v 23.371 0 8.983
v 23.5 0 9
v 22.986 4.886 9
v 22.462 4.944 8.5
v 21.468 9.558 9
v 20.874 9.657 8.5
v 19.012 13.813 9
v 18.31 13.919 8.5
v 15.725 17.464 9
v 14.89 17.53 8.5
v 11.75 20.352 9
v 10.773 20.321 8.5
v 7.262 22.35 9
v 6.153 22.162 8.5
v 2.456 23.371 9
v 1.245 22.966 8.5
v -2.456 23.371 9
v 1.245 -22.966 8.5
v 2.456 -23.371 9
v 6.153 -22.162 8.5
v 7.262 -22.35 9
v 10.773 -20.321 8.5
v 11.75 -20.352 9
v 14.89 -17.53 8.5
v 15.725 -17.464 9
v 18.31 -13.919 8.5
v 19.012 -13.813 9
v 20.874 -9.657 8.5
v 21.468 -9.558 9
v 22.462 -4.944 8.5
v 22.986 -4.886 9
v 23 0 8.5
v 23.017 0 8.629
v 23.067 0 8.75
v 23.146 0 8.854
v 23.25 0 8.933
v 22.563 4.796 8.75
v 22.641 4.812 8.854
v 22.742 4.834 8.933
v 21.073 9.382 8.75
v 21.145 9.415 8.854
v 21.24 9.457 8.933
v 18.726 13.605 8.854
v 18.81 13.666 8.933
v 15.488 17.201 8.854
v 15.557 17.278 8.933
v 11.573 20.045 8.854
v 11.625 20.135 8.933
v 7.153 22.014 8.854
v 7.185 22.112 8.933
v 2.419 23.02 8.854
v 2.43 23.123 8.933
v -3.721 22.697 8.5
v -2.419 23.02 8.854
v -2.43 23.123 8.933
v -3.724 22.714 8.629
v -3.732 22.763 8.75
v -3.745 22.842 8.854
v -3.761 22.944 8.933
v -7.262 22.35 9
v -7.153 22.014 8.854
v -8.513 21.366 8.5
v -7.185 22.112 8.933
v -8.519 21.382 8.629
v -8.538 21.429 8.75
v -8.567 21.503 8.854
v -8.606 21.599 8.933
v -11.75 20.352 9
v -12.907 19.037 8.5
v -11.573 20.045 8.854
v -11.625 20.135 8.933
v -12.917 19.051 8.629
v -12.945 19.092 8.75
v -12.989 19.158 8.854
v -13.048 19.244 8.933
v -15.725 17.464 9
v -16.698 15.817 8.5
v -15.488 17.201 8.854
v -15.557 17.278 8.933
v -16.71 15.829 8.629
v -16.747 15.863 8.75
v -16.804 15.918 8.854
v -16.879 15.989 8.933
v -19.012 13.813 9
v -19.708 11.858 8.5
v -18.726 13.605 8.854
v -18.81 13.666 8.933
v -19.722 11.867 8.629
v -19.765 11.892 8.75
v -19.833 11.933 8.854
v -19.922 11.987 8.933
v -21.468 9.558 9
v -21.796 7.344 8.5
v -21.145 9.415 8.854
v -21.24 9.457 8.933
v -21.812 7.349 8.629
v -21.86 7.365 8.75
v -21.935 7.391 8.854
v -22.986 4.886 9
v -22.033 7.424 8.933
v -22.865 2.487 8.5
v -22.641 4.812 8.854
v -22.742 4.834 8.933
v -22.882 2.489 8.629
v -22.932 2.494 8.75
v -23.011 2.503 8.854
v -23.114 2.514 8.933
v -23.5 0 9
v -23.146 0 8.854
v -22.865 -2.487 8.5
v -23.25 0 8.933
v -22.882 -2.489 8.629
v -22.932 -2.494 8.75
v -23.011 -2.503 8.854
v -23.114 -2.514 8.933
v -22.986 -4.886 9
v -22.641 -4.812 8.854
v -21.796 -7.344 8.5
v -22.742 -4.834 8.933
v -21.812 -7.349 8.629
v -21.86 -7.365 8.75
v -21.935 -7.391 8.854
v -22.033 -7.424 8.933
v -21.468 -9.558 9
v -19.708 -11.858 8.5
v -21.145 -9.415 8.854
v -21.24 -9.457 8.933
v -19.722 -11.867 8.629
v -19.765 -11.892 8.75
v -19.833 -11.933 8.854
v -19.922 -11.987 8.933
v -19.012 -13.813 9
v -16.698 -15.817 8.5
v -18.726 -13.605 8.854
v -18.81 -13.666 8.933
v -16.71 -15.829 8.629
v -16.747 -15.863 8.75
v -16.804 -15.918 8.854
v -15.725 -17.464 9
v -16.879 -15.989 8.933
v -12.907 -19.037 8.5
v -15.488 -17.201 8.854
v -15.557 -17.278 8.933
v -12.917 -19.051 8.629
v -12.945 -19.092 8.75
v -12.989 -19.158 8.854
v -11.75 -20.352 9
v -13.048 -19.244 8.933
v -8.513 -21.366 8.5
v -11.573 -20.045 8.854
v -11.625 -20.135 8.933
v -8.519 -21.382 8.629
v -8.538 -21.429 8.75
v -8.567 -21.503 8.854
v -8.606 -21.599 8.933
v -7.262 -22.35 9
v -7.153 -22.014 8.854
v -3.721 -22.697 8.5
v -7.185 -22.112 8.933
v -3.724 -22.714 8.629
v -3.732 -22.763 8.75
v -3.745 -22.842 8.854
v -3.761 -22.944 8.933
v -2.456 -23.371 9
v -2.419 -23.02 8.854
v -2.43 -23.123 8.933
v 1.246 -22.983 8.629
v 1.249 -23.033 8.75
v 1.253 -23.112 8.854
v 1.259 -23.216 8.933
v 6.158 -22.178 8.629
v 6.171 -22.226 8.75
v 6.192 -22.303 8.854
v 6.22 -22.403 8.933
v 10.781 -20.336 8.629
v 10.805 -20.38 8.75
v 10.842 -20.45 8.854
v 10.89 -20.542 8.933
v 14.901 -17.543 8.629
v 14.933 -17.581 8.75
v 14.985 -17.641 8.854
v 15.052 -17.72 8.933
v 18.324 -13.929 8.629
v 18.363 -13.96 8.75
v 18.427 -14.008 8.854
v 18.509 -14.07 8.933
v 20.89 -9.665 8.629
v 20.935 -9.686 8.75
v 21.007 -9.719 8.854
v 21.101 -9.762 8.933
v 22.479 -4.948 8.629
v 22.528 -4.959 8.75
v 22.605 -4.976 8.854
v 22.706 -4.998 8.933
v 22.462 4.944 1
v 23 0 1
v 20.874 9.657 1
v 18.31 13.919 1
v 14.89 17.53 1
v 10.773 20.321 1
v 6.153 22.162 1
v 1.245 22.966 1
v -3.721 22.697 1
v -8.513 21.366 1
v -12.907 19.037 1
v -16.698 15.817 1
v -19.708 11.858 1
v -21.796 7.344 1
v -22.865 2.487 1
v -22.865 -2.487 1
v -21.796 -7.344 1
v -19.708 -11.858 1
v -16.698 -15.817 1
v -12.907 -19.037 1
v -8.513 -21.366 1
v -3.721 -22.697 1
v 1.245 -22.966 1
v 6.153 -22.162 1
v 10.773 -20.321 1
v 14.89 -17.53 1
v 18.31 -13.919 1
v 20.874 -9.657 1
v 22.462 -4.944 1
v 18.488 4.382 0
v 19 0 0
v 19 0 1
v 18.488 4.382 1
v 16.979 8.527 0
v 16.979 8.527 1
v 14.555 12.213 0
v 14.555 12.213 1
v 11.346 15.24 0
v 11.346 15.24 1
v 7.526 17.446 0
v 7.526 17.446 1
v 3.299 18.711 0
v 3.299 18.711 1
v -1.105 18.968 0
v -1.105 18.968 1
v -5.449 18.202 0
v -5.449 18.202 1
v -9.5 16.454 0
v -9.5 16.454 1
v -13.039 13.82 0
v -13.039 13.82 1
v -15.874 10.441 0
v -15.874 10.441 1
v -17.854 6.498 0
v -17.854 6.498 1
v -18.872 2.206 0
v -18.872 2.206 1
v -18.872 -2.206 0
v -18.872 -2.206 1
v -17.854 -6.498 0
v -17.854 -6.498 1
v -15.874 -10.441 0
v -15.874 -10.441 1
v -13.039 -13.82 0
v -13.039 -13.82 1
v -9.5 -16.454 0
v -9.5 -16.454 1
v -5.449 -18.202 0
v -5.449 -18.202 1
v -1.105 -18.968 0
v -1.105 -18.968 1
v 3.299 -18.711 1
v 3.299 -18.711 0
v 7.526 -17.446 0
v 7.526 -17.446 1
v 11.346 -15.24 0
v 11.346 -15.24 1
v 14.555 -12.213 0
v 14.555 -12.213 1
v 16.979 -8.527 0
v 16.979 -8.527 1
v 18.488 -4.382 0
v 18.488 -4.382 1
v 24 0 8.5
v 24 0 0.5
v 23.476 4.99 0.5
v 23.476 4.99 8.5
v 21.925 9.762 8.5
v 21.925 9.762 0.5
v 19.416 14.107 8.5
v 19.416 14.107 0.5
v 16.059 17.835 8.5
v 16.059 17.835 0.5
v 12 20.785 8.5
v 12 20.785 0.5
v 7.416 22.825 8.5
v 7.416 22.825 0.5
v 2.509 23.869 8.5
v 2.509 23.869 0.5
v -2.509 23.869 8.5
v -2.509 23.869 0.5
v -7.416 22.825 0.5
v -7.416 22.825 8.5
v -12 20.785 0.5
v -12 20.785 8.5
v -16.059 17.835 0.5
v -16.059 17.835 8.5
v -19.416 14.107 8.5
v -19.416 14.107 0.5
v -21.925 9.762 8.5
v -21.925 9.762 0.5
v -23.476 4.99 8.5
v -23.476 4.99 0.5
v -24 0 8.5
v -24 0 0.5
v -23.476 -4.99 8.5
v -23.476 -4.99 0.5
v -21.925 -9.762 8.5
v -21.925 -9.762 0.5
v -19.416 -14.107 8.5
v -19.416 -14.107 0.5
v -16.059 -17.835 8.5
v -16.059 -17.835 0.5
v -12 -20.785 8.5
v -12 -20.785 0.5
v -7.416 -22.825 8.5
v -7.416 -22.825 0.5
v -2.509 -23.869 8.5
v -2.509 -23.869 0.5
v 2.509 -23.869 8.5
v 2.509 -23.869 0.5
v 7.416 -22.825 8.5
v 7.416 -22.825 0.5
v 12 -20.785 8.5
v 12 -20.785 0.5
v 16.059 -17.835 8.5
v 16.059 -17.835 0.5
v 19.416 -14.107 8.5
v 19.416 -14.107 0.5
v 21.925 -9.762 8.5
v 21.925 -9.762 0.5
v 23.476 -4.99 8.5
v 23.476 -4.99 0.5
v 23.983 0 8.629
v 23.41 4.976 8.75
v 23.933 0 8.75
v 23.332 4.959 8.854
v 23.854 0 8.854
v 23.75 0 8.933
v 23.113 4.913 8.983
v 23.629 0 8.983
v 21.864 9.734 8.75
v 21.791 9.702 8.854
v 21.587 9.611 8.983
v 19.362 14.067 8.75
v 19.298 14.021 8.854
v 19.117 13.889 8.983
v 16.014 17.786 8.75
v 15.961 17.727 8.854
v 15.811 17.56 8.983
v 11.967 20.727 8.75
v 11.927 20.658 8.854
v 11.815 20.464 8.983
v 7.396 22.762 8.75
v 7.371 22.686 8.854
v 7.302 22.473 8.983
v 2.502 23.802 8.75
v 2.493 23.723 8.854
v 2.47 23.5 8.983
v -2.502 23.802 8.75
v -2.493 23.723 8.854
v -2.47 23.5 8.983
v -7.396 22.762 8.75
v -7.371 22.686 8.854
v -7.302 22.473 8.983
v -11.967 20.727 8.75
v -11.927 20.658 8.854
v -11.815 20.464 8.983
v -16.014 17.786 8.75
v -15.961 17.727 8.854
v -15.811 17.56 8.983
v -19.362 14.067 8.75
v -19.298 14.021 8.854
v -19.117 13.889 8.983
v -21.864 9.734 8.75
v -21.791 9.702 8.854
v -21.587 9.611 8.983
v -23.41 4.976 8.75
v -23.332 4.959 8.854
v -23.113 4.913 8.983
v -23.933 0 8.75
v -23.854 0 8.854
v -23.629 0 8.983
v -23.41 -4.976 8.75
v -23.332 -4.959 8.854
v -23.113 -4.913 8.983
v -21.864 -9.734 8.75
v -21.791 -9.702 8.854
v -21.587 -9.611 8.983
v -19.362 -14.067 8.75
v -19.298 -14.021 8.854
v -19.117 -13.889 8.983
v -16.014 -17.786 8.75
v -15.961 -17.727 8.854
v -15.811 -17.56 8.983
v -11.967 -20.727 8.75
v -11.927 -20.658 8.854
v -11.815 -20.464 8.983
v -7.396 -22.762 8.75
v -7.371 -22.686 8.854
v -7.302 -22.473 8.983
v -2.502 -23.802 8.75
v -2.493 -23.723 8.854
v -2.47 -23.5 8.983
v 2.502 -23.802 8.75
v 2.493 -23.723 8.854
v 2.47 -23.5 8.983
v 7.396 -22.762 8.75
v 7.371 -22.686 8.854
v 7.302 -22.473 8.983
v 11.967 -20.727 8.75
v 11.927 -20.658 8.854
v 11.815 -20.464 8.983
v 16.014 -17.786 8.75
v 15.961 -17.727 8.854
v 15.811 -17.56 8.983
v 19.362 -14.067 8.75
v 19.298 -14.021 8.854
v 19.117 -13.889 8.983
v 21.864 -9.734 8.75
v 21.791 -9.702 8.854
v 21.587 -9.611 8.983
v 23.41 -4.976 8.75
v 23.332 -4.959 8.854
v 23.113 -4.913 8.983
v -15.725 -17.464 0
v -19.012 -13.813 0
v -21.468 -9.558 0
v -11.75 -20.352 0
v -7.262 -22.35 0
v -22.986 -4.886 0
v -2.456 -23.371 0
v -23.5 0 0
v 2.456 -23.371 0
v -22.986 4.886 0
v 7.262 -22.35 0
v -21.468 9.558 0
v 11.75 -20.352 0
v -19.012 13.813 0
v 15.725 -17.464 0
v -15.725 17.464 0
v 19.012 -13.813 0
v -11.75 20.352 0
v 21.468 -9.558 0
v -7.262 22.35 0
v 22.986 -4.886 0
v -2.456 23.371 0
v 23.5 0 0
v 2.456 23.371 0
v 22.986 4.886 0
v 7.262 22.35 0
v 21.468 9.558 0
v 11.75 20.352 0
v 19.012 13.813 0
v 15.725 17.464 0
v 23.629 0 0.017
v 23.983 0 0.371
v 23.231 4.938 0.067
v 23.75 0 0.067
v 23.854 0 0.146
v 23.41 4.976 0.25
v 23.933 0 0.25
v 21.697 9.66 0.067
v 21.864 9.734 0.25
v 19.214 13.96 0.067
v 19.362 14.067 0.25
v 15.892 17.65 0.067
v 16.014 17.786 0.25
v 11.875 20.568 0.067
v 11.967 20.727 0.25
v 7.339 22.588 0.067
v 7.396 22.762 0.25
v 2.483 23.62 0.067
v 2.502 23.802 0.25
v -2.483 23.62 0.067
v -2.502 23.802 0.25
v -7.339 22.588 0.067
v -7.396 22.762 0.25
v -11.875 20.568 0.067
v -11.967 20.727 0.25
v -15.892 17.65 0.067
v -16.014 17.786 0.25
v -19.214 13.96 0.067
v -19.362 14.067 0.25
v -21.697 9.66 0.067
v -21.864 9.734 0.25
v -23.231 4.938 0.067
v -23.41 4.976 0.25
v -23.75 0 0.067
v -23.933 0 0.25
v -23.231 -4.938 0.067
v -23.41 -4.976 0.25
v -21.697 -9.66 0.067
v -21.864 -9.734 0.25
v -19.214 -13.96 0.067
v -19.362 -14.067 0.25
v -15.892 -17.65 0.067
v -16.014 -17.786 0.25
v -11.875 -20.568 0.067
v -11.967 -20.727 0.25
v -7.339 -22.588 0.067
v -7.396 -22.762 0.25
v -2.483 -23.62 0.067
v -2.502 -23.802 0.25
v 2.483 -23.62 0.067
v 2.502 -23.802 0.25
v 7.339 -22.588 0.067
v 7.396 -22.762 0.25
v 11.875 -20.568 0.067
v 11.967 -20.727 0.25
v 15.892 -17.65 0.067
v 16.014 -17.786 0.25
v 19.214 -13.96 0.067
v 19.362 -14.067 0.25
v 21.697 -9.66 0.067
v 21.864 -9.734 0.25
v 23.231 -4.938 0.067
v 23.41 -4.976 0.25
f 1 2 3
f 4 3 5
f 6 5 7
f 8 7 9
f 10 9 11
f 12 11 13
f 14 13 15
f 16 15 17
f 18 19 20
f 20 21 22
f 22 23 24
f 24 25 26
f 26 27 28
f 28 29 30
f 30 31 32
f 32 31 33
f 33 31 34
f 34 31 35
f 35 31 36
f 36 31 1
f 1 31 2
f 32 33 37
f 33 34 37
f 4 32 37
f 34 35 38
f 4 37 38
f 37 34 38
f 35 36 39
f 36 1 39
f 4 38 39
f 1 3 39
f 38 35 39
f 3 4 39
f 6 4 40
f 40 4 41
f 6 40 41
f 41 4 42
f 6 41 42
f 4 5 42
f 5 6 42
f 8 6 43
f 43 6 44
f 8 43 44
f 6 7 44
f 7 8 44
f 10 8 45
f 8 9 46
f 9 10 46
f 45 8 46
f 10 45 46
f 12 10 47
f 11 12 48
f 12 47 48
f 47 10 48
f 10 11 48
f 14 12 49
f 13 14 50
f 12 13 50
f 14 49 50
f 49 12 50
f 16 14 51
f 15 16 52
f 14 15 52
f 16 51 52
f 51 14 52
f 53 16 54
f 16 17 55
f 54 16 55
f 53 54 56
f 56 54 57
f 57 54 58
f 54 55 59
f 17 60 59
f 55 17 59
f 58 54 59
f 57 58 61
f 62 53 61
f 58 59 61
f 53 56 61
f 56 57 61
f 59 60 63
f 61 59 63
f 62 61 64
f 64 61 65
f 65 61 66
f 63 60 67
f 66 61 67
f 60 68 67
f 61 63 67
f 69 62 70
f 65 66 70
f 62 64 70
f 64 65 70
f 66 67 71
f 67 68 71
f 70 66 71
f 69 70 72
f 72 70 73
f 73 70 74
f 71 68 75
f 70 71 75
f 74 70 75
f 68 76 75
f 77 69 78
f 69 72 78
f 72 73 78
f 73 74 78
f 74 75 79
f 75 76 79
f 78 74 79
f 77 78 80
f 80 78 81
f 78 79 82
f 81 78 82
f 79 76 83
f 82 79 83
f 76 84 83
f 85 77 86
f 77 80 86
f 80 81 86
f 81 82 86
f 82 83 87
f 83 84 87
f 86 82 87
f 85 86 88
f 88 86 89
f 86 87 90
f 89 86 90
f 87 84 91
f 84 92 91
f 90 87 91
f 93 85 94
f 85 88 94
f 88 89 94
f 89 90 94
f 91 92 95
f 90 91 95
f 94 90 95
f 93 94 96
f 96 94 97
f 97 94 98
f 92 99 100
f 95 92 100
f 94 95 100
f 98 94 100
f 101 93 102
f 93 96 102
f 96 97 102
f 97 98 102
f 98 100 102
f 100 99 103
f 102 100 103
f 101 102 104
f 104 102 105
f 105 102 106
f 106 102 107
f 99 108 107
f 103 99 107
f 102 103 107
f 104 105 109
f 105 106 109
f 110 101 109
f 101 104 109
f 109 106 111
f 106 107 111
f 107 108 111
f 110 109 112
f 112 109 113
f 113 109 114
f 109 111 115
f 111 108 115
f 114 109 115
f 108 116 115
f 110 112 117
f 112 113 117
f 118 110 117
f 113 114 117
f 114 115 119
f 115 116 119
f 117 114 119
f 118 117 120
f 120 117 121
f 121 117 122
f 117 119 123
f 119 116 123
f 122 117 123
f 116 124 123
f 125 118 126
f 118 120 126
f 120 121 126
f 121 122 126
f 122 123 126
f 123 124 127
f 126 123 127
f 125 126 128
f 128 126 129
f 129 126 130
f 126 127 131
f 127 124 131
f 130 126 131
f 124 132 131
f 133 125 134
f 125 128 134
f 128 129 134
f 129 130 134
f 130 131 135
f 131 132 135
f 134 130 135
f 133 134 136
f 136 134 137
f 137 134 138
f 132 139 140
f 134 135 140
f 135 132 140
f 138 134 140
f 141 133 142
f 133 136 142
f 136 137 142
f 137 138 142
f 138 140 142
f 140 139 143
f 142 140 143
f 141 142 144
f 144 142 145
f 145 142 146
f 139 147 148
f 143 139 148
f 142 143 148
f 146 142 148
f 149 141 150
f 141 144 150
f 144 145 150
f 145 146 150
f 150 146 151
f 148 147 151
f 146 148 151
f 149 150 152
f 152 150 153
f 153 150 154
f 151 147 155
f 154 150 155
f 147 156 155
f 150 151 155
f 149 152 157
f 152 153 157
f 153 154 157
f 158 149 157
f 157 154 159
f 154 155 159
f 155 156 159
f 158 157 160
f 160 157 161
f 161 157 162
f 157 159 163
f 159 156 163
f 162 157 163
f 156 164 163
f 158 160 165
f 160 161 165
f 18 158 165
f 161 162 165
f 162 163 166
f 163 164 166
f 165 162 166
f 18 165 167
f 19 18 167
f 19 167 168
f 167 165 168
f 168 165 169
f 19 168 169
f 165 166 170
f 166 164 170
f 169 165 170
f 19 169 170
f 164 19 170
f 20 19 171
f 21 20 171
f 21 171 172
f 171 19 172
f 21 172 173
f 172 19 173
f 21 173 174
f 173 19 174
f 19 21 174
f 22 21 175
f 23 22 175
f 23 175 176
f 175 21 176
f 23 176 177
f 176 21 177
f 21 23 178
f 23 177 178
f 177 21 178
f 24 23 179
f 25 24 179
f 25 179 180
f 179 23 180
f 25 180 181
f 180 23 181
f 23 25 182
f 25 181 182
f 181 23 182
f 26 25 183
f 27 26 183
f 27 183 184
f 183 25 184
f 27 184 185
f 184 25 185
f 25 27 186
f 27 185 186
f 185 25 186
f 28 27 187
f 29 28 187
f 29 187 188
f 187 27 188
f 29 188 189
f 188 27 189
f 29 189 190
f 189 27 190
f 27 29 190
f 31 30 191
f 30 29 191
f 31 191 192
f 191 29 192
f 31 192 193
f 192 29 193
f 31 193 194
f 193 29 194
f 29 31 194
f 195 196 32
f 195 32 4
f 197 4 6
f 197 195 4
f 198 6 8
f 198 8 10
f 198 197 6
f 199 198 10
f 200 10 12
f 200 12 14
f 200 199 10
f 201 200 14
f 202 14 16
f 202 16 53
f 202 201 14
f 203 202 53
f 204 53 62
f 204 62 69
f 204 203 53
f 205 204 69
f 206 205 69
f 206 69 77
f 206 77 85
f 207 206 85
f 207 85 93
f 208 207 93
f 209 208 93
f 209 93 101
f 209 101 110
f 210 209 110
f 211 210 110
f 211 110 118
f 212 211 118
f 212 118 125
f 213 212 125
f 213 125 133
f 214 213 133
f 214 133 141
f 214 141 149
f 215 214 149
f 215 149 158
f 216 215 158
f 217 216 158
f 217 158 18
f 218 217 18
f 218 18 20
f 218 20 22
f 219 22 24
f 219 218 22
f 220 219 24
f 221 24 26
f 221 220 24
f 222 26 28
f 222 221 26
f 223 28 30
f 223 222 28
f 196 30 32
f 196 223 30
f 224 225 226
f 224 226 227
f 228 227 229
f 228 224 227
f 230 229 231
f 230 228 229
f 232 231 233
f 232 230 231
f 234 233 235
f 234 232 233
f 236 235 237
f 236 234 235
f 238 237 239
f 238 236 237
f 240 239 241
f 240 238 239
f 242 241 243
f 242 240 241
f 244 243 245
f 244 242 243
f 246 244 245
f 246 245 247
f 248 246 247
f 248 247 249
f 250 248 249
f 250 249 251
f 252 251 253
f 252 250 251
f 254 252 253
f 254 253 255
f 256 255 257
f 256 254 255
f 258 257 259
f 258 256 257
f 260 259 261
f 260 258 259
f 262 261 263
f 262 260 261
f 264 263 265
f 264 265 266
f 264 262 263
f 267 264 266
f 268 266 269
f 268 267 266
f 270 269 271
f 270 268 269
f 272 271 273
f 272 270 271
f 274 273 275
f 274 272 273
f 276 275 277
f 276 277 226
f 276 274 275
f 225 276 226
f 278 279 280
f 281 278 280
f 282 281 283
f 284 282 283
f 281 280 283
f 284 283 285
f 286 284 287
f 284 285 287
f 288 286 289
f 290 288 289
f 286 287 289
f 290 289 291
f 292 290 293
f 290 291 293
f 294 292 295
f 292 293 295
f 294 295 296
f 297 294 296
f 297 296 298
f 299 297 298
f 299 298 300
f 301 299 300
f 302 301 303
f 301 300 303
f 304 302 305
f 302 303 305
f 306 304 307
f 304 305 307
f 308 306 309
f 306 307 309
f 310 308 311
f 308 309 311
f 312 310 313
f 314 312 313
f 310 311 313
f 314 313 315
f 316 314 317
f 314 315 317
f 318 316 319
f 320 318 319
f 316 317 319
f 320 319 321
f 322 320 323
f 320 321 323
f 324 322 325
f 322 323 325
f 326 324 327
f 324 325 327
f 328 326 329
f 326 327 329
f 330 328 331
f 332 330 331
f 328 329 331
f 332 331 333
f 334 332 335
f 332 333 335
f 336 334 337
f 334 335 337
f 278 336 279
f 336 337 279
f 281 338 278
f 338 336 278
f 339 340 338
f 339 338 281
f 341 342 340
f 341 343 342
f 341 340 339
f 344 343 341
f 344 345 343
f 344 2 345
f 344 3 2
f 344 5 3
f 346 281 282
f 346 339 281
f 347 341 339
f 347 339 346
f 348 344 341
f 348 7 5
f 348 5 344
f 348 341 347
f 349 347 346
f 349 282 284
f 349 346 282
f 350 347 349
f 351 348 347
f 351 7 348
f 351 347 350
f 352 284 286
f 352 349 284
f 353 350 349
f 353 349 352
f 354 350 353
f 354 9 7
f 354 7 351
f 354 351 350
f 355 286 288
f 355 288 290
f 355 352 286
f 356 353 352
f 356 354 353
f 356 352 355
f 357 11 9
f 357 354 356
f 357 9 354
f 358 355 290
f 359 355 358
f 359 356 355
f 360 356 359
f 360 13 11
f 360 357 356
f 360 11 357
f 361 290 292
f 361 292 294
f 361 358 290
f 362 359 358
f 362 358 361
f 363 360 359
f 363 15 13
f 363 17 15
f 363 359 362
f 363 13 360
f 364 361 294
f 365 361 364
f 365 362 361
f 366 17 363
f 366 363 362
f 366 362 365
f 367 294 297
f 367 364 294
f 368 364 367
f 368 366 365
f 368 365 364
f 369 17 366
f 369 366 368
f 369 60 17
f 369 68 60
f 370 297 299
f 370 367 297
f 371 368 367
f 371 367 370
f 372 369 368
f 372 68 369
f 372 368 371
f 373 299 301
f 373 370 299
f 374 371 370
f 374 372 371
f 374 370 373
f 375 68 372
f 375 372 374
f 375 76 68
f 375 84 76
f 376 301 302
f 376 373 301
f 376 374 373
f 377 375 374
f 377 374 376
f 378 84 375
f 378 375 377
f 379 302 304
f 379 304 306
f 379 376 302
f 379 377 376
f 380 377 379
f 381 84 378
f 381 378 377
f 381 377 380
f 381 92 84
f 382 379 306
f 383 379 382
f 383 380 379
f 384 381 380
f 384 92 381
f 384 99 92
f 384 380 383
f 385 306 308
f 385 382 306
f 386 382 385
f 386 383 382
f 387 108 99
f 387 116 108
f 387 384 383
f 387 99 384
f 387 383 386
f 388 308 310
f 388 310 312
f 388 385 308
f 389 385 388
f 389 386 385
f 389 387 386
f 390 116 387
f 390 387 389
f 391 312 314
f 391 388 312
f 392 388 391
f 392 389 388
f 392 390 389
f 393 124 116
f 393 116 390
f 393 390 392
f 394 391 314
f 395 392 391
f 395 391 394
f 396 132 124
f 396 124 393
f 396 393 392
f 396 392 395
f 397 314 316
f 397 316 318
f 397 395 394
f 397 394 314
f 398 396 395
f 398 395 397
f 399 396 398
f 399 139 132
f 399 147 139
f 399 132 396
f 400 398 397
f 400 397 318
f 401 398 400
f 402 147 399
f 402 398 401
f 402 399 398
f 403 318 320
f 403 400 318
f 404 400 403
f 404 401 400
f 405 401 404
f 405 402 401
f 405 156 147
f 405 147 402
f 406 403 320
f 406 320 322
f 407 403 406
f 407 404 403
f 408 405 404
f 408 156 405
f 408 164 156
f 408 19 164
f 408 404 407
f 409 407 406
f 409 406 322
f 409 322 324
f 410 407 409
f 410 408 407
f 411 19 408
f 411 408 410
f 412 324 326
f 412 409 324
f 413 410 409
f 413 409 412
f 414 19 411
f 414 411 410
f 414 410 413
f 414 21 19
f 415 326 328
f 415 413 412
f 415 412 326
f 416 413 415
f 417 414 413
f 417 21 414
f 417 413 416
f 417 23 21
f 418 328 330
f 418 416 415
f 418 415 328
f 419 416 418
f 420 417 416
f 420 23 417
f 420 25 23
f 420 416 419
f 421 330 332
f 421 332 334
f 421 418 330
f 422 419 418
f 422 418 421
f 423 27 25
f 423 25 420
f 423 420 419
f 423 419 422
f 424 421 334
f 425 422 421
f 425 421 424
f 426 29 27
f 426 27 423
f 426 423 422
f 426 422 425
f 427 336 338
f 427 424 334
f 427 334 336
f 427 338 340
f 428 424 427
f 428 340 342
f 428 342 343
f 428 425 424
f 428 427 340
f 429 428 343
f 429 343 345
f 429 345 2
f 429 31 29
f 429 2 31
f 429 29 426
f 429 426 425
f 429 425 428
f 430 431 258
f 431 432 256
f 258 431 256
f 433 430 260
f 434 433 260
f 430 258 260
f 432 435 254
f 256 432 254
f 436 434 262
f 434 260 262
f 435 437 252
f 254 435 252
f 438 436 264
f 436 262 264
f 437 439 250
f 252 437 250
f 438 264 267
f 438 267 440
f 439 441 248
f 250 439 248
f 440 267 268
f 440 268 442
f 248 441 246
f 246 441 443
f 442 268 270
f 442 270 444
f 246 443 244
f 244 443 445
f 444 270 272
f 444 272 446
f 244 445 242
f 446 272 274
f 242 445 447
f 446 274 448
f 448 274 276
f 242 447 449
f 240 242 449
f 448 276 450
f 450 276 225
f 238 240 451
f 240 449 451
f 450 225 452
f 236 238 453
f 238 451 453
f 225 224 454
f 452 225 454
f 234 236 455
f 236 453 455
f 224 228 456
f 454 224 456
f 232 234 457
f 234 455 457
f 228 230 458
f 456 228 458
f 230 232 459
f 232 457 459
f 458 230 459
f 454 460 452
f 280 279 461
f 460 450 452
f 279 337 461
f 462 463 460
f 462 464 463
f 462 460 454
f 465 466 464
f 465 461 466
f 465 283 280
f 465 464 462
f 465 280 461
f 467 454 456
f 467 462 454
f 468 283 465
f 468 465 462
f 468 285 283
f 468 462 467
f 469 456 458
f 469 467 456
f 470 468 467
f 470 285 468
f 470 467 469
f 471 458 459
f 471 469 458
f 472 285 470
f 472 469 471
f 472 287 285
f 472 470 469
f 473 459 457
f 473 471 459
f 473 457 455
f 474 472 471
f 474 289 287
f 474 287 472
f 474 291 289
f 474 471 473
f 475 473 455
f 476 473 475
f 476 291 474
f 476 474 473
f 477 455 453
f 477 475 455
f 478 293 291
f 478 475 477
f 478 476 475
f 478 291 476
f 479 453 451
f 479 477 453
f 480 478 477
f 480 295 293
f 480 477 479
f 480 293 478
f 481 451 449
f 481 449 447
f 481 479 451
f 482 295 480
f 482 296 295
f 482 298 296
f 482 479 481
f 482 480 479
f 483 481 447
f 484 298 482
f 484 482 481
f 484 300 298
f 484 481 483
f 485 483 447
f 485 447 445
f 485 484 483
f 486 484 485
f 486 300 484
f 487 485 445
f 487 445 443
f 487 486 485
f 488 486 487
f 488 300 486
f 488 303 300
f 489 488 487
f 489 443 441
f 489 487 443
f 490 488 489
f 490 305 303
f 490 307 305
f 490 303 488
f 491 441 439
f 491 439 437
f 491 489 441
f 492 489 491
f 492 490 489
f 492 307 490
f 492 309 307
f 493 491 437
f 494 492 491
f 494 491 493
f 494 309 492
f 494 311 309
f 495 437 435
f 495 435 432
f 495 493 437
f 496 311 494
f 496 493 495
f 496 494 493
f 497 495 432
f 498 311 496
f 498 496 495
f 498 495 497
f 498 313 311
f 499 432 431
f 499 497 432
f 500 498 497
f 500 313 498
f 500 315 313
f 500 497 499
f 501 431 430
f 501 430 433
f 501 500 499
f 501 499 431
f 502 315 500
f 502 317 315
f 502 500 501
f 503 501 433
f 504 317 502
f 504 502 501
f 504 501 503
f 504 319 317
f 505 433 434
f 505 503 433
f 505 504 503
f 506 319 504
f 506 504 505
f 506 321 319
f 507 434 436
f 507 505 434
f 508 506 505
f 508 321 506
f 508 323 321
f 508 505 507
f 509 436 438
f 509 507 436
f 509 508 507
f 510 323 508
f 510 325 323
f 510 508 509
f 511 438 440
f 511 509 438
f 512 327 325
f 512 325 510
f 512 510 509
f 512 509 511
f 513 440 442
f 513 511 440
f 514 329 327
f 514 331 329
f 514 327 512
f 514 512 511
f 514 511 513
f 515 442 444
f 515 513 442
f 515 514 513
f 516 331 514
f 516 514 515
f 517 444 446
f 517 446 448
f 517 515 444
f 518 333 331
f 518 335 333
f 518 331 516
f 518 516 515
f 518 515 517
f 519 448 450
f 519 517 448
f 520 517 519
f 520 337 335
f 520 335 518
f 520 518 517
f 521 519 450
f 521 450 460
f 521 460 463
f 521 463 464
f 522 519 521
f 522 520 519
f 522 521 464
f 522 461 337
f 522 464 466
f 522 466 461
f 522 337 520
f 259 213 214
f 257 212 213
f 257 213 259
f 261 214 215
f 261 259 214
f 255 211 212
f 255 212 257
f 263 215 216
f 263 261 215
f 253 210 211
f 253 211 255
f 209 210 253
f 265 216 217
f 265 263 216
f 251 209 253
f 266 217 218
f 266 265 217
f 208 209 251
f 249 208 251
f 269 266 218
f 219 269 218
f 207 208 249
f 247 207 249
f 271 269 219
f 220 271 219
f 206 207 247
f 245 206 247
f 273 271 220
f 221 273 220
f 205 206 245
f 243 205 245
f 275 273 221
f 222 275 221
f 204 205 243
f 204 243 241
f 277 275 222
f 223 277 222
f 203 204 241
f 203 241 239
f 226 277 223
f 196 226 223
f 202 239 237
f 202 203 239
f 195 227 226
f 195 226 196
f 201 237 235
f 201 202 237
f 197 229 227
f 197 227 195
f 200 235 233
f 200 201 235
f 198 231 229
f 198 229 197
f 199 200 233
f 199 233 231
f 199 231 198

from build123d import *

# Parameters (mm, degrees)
F0_R     = 24
F0_R_2   = 23
F1_DEPTH = 9
F0_R_3   = 19
F2_DEPTH = 1
F3_R     = 0.49999


# Not quite as in the source:
# - a fillet or chamfer is up to 0.001 mm smaller than in the source, because OpenCascade refuses the exact size


with BuildPart() as f1:
    # F0 (on Top) → F1 (new body)
    with BuildSketch(Plane.XY):
        Circle(F0_R)
        Circle(F0_R_2, mode=Mode.SUBTRACT)
    extrude(amount=F1_DEPTH)

    # F0 (on Top) → F2 (join)
    with BuildSketch(Plane.XY):
        Circle(F0_R_2)
        Circle(F0_R_3, mode=Mode.SUBTRACT)
    extrude(amount=F2_DEPTH)

    # F3 (radius 0.5 in the source; OpenCascade refuses exactly that, so slightly less here)
    f3_edges = [f1.edges().sort_by_distance(p)[0] for p in [
        (-24, 0, 0),
        (-24, 0, 9),
        (-23, 0, 9),
    ]]
    fillet(f3_edges, radius=F3_R)


solid = f1.part
